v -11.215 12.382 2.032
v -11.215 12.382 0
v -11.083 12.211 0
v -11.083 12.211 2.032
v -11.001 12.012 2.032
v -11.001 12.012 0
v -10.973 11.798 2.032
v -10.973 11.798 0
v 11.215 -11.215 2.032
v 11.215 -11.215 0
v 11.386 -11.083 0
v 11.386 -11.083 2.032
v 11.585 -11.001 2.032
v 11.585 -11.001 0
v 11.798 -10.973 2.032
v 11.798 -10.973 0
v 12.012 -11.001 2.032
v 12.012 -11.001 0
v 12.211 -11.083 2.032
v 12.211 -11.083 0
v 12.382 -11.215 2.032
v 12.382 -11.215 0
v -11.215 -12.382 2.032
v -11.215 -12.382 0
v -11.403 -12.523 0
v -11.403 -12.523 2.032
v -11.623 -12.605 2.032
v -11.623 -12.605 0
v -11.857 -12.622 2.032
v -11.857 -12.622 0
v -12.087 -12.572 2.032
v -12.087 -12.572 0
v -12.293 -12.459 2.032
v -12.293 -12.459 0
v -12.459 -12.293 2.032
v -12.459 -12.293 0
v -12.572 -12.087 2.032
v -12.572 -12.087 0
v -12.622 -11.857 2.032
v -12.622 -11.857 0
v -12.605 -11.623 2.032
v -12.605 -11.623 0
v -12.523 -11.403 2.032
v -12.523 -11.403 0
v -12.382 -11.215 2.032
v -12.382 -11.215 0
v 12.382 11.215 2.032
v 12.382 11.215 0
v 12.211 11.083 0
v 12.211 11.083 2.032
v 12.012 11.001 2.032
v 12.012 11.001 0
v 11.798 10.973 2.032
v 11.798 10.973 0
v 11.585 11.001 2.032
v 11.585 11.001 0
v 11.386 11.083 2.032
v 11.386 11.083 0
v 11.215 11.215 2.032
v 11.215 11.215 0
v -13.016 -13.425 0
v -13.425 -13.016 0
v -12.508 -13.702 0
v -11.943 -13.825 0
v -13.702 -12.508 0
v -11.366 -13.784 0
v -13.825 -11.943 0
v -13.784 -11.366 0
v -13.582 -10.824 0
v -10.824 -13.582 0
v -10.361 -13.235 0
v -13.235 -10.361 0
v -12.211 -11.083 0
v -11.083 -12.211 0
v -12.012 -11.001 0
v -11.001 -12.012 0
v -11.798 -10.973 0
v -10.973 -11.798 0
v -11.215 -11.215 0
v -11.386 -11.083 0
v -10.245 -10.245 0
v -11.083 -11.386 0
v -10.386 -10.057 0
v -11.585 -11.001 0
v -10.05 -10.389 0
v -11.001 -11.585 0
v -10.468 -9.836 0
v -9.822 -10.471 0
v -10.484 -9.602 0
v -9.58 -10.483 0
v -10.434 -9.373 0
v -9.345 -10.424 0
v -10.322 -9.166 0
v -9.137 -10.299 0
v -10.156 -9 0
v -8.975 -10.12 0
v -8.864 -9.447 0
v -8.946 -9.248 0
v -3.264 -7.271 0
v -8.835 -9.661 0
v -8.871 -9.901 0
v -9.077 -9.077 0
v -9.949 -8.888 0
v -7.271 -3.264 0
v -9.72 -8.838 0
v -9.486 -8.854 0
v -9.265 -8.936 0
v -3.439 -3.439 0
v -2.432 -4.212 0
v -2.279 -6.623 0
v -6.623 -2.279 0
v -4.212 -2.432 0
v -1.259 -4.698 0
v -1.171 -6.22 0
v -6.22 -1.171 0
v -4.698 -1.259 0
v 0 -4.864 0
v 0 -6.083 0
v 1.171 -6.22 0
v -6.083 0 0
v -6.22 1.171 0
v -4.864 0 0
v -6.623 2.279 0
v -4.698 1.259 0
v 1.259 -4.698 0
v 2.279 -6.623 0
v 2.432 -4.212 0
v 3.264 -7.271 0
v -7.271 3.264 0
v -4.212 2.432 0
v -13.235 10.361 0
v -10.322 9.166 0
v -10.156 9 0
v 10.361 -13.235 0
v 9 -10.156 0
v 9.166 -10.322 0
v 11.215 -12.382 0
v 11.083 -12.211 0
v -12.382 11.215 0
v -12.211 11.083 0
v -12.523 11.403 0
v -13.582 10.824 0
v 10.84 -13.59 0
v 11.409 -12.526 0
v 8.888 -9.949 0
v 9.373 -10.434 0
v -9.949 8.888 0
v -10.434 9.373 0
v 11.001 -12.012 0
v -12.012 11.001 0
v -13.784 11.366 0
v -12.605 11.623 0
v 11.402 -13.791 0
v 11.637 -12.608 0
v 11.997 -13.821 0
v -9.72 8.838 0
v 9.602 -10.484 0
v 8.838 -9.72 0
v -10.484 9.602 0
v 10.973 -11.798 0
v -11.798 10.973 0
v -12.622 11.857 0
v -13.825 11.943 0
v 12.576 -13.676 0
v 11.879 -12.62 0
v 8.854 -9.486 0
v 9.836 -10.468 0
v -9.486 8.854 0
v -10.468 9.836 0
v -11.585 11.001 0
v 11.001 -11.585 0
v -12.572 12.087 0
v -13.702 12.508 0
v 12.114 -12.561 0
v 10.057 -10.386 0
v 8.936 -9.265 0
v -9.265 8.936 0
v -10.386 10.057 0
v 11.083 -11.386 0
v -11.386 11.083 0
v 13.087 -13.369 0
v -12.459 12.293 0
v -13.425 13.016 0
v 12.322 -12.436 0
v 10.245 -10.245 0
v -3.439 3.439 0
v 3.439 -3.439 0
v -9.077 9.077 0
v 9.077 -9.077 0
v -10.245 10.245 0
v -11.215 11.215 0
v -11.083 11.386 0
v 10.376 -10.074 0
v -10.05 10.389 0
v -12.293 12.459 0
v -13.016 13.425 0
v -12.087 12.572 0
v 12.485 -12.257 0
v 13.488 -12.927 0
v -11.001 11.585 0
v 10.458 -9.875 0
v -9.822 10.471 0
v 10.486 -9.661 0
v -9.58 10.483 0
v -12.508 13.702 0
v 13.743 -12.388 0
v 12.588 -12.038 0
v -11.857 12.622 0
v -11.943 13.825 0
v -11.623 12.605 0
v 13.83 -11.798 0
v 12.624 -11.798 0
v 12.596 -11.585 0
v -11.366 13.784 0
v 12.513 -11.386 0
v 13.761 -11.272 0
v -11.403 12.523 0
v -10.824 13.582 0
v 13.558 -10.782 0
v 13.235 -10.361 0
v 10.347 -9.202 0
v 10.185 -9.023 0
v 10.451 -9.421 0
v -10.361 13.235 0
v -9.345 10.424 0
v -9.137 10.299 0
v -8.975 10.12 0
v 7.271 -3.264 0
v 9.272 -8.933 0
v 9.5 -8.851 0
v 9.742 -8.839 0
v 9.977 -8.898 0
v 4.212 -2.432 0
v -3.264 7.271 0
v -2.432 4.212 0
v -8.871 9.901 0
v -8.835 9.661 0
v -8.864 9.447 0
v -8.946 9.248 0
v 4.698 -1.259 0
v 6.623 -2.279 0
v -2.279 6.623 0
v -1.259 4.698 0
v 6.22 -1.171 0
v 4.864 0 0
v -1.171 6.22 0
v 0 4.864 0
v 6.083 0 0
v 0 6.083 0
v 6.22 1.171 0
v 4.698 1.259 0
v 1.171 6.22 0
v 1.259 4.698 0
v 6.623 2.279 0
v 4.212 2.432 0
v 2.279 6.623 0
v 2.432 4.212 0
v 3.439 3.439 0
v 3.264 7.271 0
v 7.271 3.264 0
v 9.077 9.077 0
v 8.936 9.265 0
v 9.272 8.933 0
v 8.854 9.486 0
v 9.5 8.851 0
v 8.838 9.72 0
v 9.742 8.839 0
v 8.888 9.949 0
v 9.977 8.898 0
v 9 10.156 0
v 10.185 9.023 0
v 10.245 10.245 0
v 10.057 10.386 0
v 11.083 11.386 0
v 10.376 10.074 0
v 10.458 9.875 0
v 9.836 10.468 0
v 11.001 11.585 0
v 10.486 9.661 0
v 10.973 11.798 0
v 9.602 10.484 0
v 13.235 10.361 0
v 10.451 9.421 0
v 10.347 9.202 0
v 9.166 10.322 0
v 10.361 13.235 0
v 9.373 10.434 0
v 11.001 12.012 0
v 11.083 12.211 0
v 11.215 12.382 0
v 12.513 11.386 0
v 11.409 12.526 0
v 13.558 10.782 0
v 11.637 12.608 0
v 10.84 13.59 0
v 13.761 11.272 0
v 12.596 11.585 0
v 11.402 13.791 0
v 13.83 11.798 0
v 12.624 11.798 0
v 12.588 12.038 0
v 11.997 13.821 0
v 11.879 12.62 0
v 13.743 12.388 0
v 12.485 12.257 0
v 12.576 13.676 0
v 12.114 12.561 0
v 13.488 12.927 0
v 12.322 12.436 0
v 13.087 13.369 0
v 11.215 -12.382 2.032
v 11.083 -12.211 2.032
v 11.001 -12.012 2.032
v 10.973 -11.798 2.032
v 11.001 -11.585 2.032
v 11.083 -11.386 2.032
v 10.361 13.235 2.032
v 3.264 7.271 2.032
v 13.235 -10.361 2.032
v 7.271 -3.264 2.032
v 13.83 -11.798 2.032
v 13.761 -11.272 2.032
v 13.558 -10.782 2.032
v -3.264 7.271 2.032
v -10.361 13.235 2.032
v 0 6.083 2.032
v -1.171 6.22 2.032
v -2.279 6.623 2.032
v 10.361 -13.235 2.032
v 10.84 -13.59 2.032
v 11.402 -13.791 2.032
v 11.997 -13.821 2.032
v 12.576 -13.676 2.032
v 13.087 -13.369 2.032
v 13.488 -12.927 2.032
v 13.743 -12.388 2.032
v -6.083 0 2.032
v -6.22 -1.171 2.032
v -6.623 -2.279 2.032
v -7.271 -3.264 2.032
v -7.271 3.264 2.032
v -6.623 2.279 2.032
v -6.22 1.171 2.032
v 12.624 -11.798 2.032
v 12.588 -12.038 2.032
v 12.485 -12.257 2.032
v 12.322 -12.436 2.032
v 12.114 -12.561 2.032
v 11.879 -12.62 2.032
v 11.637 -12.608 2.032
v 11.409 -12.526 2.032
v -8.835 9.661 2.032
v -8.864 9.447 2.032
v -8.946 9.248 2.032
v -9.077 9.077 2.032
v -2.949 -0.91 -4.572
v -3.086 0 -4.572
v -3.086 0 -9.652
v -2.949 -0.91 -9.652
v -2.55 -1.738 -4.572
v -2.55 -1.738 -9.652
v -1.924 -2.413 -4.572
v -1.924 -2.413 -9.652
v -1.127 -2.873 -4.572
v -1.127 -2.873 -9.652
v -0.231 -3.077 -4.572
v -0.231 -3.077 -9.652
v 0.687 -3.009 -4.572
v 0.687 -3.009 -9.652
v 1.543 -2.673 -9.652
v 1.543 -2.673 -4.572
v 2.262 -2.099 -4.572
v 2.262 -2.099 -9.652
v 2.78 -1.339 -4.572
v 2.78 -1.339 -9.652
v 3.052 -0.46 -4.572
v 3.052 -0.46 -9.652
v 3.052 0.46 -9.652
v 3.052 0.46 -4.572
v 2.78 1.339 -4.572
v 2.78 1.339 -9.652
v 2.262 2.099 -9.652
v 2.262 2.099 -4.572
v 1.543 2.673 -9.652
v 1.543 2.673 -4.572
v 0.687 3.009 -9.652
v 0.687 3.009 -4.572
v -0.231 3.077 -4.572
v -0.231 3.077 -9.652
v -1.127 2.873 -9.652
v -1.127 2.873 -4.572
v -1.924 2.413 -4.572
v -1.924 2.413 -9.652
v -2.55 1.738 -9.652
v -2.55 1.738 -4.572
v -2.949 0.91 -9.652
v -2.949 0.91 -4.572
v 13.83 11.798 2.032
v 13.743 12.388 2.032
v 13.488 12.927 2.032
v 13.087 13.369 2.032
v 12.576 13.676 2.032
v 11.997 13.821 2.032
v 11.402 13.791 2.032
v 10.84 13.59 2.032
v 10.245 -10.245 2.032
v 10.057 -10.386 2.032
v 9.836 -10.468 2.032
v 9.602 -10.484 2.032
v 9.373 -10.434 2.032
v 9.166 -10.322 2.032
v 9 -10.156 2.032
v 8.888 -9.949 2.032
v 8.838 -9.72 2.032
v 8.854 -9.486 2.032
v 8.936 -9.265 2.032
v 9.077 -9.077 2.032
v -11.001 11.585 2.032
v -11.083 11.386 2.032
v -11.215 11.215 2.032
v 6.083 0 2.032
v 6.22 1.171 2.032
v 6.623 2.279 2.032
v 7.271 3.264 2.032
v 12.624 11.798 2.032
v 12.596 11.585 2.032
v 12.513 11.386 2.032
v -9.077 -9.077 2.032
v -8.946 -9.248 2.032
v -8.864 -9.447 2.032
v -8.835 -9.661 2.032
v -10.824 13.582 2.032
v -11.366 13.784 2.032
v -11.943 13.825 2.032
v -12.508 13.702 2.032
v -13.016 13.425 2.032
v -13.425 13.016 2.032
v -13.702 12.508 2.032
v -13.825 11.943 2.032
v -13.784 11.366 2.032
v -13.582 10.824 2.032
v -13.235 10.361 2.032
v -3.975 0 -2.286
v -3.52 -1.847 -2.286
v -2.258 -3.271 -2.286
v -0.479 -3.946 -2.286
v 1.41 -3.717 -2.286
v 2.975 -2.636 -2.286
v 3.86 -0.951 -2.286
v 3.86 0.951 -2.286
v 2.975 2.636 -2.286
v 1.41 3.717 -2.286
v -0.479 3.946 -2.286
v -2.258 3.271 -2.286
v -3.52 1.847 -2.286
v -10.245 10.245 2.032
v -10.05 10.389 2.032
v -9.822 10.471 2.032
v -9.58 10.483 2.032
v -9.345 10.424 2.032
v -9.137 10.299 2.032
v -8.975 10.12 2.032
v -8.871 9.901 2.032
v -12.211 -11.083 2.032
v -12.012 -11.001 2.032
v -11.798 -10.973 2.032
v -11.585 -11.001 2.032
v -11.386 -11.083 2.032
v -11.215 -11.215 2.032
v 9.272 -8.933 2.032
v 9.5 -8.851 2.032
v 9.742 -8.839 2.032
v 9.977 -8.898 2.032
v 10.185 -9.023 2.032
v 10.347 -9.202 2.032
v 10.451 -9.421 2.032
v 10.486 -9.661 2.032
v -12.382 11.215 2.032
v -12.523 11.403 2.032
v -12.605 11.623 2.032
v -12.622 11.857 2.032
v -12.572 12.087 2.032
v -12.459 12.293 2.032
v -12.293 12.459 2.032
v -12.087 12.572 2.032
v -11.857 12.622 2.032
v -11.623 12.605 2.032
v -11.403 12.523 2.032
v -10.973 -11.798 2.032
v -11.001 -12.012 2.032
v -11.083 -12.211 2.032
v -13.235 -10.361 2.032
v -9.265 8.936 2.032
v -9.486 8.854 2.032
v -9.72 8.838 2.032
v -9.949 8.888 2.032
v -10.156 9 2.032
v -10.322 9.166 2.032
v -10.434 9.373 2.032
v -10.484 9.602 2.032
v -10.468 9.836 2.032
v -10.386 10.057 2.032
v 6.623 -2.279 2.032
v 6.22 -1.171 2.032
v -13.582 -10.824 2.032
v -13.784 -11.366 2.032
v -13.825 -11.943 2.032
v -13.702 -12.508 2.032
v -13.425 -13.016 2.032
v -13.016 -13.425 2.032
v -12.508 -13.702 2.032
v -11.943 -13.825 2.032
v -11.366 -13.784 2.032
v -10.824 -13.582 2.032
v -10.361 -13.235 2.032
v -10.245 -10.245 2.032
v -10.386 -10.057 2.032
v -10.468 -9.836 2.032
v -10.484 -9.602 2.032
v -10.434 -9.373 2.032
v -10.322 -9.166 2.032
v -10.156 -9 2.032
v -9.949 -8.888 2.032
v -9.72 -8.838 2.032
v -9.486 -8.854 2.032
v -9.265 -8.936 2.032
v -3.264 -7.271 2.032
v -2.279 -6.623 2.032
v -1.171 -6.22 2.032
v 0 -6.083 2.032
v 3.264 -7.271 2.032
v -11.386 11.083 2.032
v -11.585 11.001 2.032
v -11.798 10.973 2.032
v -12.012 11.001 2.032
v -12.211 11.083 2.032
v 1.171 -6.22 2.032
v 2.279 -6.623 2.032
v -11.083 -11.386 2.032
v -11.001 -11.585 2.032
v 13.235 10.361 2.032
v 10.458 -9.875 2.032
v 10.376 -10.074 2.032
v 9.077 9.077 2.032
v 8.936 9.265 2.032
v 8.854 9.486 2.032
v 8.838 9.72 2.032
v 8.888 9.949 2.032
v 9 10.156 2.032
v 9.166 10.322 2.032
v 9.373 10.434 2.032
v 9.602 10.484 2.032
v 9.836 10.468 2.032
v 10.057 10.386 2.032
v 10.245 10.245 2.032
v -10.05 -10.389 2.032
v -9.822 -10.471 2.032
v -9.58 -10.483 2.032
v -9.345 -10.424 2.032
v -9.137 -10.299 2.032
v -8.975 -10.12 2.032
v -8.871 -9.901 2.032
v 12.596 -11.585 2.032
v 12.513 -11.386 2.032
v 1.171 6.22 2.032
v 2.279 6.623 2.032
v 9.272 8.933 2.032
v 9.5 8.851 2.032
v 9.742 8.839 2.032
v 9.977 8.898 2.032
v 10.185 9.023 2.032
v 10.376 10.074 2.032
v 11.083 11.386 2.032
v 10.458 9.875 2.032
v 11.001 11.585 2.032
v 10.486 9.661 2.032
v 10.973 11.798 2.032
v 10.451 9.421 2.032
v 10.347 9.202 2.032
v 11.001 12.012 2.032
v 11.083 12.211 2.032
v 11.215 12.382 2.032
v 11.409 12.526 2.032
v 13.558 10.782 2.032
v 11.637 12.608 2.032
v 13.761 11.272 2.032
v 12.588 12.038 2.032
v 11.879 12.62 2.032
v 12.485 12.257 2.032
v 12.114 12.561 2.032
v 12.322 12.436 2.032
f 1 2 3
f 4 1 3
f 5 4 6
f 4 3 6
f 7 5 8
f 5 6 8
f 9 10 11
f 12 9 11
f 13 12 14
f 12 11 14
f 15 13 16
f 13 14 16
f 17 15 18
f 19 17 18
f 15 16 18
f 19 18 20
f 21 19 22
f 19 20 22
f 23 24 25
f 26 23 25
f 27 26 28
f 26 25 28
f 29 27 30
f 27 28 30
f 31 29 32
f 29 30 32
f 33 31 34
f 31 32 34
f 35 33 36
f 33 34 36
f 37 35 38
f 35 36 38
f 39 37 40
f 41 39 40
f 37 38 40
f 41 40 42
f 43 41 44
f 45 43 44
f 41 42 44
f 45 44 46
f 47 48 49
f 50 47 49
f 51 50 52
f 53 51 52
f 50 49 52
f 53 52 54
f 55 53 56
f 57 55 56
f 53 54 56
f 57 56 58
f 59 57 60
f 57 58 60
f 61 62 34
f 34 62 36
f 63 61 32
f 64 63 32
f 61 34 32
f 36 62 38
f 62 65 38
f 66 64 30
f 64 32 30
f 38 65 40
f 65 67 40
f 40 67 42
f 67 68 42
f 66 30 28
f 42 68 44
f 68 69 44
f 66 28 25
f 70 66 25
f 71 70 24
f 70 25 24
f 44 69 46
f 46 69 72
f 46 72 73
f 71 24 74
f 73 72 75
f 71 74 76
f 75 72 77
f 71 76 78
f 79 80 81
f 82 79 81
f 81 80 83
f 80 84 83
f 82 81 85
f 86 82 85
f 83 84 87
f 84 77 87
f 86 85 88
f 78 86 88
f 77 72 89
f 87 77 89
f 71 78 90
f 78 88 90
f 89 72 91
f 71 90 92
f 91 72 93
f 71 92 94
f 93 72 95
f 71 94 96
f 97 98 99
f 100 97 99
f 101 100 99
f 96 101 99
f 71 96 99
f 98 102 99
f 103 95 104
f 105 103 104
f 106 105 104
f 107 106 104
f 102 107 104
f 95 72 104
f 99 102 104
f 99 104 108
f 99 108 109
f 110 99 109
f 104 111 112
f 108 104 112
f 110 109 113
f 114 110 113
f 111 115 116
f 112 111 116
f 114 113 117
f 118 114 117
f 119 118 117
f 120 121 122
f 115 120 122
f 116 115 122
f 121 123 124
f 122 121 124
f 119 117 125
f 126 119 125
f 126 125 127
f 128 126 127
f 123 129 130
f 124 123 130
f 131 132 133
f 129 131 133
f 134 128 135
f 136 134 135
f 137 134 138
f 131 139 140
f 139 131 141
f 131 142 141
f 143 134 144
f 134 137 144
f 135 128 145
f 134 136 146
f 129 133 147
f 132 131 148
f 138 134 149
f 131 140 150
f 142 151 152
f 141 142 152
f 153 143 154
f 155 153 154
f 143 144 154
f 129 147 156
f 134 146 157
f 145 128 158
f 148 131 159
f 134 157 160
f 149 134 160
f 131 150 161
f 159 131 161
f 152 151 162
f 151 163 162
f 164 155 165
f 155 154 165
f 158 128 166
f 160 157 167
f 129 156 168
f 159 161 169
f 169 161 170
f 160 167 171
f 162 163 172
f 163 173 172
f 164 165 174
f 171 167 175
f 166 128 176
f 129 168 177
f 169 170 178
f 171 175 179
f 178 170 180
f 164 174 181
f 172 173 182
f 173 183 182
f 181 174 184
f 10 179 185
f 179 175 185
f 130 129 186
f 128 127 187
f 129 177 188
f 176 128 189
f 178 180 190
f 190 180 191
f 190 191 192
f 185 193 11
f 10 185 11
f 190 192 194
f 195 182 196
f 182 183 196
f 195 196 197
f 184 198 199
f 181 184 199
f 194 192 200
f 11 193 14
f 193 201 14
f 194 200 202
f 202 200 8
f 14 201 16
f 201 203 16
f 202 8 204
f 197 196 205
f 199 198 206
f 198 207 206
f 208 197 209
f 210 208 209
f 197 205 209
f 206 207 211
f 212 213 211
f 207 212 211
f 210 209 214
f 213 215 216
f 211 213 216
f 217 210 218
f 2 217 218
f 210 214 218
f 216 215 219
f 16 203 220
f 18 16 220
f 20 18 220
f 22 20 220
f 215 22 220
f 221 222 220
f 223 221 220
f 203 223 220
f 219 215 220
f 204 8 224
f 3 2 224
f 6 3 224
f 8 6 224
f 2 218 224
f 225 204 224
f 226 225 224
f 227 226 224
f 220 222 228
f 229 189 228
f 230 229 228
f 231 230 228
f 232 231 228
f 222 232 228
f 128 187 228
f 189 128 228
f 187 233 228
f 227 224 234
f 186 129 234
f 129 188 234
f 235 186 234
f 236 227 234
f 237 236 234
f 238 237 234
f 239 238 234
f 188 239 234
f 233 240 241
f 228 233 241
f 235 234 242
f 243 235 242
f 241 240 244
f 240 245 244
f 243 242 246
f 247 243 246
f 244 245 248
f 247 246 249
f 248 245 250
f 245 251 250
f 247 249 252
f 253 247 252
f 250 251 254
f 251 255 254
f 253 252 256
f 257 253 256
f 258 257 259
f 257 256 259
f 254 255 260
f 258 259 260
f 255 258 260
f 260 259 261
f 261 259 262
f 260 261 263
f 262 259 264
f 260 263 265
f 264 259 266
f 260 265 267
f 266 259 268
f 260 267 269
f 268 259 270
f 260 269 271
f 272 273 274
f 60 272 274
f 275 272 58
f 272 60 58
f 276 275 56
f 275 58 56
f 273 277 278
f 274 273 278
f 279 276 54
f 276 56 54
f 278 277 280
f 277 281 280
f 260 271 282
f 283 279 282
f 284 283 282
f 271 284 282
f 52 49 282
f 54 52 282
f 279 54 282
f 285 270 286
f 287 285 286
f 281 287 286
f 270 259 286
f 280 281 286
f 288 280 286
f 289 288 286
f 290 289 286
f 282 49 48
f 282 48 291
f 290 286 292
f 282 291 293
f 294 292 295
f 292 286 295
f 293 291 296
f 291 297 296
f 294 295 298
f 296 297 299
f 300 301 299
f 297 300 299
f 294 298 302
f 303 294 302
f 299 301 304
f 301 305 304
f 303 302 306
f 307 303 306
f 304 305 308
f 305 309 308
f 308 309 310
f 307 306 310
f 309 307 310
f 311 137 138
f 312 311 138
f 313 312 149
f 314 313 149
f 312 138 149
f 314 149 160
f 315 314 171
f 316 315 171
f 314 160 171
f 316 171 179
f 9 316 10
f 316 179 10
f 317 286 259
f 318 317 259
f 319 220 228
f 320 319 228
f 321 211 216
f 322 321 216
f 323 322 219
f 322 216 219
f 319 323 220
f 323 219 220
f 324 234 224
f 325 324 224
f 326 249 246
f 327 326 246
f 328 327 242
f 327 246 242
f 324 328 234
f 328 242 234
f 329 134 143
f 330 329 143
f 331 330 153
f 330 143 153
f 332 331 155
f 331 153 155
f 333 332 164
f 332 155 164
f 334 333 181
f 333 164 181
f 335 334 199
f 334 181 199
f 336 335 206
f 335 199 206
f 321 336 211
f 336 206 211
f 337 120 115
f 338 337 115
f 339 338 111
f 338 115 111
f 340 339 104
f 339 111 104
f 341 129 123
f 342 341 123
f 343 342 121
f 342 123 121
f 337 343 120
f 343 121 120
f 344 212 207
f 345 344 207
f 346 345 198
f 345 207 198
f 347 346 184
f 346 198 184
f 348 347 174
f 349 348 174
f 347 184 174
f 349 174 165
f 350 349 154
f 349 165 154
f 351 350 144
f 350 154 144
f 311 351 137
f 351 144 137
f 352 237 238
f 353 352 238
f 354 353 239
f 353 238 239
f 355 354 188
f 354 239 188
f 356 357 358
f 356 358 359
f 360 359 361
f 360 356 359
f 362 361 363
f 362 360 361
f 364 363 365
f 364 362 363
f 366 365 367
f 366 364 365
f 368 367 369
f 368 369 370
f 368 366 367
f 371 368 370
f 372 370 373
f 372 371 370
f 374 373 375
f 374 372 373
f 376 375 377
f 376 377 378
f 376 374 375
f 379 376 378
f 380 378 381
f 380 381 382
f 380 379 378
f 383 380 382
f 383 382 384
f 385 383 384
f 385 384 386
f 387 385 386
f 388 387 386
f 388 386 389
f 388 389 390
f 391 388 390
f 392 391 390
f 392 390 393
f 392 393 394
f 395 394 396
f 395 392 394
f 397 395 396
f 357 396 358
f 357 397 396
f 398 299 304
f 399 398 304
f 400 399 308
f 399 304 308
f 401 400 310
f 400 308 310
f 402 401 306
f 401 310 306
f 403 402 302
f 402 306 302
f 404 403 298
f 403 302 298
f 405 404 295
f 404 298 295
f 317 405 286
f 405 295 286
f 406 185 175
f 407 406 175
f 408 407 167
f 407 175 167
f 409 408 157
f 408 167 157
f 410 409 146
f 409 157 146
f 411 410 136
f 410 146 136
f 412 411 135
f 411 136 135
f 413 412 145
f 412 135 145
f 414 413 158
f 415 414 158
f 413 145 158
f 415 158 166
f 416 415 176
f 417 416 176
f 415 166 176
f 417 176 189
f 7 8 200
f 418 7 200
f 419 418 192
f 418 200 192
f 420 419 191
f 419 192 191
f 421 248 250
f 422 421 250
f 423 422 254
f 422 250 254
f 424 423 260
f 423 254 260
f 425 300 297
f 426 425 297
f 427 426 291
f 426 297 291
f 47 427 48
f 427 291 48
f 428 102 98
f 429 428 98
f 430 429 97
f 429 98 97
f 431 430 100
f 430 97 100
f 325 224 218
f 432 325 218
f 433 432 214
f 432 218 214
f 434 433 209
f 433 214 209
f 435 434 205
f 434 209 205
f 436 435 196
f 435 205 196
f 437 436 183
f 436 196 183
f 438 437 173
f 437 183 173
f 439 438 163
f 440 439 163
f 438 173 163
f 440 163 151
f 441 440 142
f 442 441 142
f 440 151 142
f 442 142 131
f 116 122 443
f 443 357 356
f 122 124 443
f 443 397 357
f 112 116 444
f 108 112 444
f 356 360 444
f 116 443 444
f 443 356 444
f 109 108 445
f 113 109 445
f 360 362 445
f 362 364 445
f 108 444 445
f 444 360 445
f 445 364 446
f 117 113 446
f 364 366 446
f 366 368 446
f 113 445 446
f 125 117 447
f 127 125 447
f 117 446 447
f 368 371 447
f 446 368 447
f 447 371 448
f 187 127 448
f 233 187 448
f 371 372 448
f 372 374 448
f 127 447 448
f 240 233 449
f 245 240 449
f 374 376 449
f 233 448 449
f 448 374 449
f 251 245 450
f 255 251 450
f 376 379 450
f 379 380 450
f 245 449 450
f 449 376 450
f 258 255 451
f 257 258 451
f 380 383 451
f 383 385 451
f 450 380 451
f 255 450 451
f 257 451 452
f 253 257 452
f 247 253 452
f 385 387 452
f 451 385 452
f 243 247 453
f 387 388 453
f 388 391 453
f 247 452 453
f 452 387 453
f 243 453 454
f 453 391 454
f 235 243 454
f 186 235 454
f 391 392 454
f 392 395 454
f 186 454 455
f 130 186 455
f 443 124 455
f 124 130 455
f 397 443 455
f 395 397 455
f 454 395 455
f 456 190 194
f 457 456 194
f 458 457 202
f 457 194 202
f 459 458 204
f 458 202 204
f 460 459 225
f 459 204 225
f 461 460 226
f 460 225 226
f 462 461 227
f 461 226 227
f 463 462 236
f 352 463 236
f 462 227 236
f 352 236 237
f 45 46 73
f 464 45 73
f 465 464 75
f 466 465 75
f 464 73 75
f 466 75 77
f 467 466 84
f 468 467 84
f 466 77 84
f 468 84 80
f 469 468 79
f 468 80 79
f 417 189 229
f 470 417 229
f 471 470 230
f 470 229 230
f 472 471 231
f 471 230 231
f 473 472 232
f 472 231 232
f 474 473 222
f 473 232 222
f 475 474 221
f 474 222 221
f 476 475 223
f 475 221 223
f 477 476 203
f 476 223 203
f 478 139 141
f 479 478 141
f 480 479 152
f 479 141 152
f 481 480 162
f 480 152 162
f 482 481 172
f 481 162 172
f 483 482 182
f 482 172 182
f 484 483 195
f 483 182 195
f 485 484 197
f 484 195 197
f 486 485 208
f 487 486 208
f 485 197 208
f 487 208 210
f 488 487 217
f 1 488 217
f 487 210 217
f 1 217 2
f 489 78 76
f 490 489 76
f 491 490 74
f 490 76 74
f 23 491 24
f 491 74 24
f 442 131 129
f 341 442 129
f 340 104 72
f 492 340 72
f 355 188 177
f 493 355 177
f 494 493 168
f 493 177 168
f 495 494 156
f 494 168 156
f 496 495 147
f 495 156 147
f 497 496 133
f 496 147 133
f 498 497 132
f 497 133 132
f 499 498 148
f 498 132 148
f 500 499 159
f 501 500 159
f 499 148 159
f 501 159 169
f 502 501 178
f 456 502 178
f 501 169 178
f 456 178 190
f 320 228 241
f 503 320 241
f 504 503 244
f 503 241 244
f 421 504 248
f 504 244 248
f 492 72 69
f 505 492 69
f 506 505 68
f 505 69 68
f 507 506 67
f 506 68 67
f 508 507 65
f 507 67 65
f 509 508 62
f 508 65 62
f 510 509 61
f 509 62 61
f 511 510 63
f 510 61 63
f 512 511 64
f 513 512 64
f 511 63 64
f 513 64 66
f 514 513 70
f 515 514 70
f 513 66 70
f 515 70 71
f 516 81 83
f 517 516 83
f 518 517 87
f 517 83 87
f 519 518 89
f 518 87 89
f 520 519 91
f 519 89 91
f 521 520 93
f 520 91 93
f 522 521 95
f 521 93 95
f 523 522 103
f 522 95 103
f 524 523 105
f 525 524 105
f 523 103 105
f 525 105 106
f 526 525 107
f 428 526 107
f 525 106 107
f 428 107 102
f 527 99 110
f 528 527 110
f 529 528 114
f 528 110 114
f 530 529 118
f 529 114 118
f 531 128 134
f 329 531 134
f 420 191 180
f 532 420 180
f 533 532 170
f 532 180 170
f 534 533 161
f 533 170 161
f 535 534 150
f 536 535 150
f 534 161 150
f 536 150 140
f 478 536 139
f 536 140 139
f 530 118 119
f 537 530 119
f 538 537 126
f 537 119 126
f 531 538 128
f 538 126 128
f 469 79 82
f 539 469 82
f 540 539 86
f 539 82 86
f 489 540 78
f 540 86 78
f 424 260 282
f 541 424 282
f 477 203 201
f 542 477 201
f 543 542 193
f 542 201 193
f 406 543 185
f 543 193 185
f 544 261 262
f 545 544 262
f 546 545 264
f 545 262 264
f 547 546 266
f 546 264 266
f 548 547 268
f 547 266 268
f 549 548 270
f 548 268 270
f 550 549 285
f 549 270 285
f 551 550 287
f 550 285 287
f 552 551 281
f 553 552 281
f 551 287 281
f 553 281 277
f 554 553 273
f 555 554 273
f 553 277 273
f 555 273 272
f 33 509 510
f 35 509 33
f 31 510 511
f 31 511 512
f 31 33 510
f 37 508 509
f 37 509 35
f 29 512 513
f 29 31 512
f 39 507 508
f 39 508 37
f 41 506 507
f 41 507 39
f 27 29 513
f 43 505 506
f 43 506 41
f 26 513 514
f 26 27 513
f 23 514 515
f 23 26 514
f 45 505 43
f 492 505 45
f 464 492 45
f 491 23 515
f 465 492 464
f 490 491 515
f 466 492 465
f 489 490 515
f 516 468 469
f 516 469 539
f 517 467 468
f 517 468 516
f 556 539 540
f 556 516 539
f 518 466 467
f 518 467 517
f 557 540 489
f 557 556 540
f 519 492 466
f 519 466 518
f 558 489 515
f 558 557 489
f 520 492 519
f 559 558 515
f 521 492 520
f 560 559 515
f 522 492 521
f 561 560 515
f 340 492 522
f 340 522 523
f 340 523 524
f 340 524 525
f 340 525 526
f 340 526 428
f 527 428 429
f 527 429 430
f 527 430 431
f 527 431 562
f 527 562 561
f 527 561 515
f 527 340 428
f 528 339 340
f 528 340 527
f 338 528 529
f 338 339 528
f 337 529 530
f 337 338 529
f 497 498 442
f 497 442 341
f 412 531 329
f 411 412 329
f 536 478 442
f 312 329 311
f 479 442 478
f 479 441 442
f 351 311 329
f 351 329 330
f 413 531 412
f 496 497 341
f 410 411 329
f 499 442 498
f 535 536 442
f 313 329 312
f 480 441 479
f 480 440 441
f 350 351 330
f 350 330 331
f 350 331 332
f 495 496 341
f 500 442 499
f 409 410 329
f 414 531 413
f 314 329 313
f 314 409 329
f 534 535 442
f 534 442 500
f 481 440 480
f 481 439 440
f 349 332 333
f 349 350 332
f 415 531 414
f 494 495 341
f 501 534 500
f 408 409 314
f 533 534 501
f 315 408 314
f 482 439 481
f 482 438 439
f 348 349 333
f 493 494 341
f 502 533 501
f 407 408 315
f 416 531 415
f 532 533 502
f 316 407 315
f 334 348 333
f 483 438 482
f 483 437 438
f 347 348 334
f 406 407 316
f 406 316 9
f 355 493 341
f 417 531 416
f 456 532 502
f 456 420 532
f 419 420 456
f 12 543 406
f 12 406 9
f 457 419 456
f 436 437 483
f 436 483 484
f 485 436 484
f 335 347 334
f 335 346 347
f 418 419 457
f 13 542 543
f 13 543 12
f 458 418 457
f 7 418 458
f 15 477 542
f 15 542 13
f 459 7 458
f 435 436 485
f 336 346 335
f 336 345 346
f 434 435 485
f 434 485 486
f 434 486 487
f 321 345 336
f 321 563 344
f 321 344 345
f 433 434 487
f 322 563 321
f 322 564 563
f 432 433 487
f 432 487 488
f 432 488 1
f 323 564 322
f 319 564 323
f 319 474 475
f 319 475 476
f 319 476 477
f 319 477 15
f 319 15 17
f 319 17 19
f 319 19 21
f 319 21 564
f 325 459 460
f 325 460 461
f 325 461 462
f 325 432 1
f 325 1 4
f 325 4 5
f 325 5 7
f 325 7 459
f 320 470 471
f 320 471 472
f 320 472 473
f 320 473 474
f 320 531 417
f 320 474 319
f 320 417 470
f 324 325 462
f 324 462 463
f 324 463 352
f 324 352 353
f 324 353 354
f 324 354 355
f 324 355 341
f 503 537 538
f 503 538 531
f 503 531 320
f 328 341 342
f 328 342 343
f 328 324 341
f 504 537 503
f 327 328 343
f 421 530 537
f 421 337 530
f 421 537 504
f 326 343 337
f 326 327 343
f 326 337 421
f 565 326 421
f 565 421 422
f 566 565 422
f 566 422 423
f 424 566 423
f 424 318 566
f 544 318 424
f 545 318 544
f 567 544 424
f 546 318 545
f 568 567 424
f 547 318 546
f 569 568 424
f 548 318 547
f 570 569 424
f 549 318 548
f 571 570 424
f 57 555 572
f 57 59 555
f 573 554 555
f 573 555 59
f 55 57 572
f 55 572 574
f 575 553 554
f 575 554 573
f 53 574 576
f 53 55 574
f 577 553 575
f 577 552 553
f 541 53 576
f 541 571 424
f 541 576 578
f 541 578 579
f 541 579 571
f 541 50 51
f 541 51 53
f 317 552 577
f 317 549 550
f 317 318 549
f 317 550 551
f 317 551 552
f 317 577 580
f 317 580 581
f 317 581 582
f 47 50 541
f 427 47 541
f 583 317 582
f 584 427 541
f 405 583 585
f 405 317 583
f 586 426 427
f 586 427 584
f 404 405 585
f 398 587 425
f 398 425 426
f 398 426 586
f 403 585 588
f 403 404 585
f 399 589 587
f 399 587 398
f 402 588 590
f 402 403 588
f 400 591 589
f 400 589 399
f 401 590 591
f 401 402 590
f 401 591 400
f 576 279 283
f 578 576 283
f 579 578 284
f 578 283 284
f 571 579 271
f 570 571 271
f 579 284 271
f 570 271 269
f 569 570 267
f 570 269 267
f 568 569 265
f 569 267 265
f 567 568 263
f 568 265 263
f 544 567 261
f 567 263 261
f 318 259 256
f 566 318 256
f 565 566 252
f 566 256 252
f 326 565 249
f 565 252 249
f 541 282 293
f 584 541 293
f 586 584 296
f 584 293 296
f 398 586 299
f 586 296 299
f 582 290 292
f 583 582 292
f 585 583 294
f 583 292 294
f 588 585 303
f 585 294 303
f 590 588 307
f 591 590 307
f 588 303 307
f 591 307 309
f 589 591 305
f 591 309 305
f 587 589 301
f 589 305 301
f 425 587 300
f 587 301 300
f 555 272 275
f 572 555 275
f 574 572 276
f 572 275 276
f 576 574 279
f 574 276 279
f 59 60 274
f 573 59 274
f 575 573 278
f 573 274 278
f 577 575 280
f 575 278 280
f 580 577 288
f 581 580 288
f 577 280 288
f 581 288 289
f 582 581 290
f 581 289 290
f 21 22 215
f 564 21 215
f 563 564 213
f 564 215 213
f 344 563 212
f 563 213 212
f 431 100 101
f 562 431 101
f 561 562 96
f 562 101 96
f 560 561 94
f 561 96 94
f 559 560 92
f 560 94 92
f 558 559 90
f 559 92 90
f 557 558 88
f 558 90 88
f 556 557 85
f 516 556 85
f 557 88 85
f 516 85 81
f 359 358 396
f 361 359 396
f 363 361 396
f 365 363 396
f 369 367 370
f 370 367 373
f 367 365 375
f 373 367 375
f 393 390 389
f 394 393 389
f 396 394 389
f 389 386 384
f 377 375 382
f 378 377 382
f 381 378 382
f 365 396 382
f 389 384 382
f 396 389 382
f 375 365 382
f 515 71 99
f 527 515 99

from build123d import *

# Parameters (mm, degrees)
F1_DEPTH = 2.032
F2_DEPTH = 4.572
F4_DEPTH = 5.08


# Not quite as in the source:
# - a fillet or chamfer that OpenCascade refuses, or shapes differently, is made with other operations: its cross-section is extruded or revolved along the edge and cut away or added


with BuildPart() as f1:
    # F0 (on Top) → F1 (new body)
    with BuildSketch(Plane.XY):
        with BuildLine():
            Line((-11.2145823858, 12.3820156815), (-10.3614580543, 13.235140013))
            ThreePointArc((-10.3614580543, 13.235140013), (-13.235140013, 13.235140013), (-13.235140013, 10.3614580543))
            Line((-13.235140013, 10.3614580543), (-12.3820156815, 11.2145823858))
            ThreePointArc((-12.3820156815, 11.2145823858), (-12.3820156815, 12.3820156815), (-11.2145823858, 12.3820156815))
        make_face()
        with BuildLine():
            ThreePointArc((13.8302990336, 11.7982990336), (12.5759117682, 13.6756222437), (10.3614580543, 13.235140013))
            Line((10.3614580543, 13.235140013), (11.2145823858, 12.3820156815))
            ThreePointArc((11.2145823858, 12.3820156815), (12.1142042071, 12.5609615877), (12.6237990336, 11.7982990336))
            ThreePointArc((12.6237990336, 11.7982990336), (12.5609615877, 11.4823938602), (12.3820156815, 11.2145823858))
            Line((12.3820156815, 11.2145823858), (13.235140013, 10.3614580543))
            ThreePointArc((13.235140013, 10.3614580543), (13.6756222437, 11.0206862991), (13.8302990336, 11.7982990336))
        make_face()
        with BuildLine():
            ThreePointArc((13.8302990336, -11.7982990336), (13.6756222437, -11.0206862991), (13.235140013, -10.3614580543))
            Line((13.235140013, -10.3614580543), (12.3820156815, -11.2145823858))
            ThreePointArc((12.3820156815, -11.2145823858), (12.5609615877, -11.4823938602), (12.6237990336, -11.7982990336))
            ThreePointArc((12.6237990336, -11.7982990336), (12.1142042071, -12.5609615877), (11.2145823858, -12.3820156815))
            Line((11.2145823858, -12.3820156815), (10.3614580543, -13.235140013))
            ThreePointArc((10.3614580543, -13.235140013), (12.5759117682, -13.6756222437), (13.8302990336, -11.7982990336))
        make_face()
        with BuildLine():
            Line((-12.3820156815, -11.2145823858), (-13.235140013, -10.3614580543))
            ThreePointArc((-13.235140013, -10.3614580543), (-13.235140013, -13.235140013), (-10.3614580543, -13.235140013))
            Line((-10.3614580543, -13.235140013), (-11.2145823858, -12.3820156815))
            ThreePointArc((-11.2145823858, -12.3820156815), (-12.3820156815, -12.3820156815), (-12.3820156815, -11.2145823858))
        make_face()
        with BuildLine():
            Line((-12.3820156815, 11.2145823858), (-13.235140013, 10.3614580543))
            ThreePointArc((-13.235140013, 10.3614580543), (-11.7982990336, 9.7662990336), (-10.3614580543, 10.3614580543))
            Line((-10.3614580543, 10.3614580543), (-11.2145823858, 11.2145823858))
            ThreePointArc((-11.2145823858, 11.2145823858), (-11.7982990336, 10.9727990336), (-12.3820156815, 11.2145823858))
        make_face()
        with BuildLine():
            ThreePointArc((-9.7662990336, 11.7982990336), (-9.9209758236, 12.5759117682), (-10.3614580543, 13.235140013))
            Line((-10.3614580543, 13.235140013), (-11.2145823858, 12.3820156815))
            ThreePointArc((-11.2145823858, 12.3820156815), (-11.0356364796, 12.1142042071), (-10.9727990336, 11.7982990336))
            ThreePointArc((-10.9727990336, 11.7982990336), (-11.0356364796, 11.4823938602), (-11.2145823858, 11.2145823858))
            Line((-11.2145823858, 11.2145823858), (-10.3614580543, 10.3614580543))
            ThreePointArc((-10.3614580543, 10.3614580543), (-9.9209758236, 11.0206862991), (-9.7662990336, 11.7982990336))
        make_face()
        with BuildLine():
            Line((11.2145823858, 12.3820156815), (10.3614580543, 13.235140013))
            ThreePointArc((10.3614580543, 13.235140013), (9.7662990336, 11.7982990336), (10.3614580543, 10.3614580543))
            Line((10.3614580543, 10.3614580543), (11.2145823858, 11.2145823858))
            ThreePointArc((11.2145823858, 11.2145823858), (10.9727990336, 11.7982990336), (11.2145823858, 12.3820156815))
        make_face()
        with BuildLine():
            Line((11.2145823858, 11.2145823858), (10.3614580543, 10.3614580543))
            ThreePointArc((10.3614580543, 10.3614580543), (11.7982990336, 9.7662990336), (13.235140013, 10.3614580543))
            Line((13.235140013, 10.3614580543), (12.3820156815, 11.2145823858))
            ThreePointArc((12.3820156815, 11.2145823858), (11.7982990336, 10.9727990336), (11.2145823858, 11.2145823858))
        make_face()
        with BuildLine():
            Line((12.3820156815, -11.2145823858), (13.235140013, -10.3614580543))
            ThreePointArc((13.235140013, -10.3614580543), (11.7982990336, -9.7662990336), (10.3614580543, -10.3614580543))
            Line((10.3614580543, -10.3614580543), (11.2145823858, -11.2145823858))
            ThreePointArc((11.2145823858, -11.2145823858), (11.7982990336, -10.9727990336), (12.3820156815, -11.2145823858))
        make_face()
        with BuildLine():
            ThreePointArc((10.3614580543, -10.3614580543), (9.7662990336, -11.7982990336), (10.3614580543, -13.235140013))
            Line((10.3614580543, -13.235140013), (11.2145823858, -12.3820156815))
            ThreePointArc((11.2145823858, -12.3820156815), (10.9727990336, -11.7982990336), (11.2145823858, -11.2145823858))
            Line((11.2145823858, -11.2145823858), (10.3614580543, -10.3614580543))
        make_face()
        with BuildLine():
            Line((-11.2145823858, -12.3820156815), (-10.3614580543, -13.235140013))
            ThreePointArc((-10.3614580543, -13.235140013), (-9.9209758236, -12.5759117682), (-9.7662990336, -11.7982990336))
            ThreePointArc((-9.7662990336, -11.7982990336), (-9.9209758236, -11.0206862991), (-10.3614580543, -10.3614580543))
            Line((-10.3614580543, -10.3614580543), (-11.2145823858, -11.2145823858))
            ThreePointArc((-11.2145823858, -11.2145823858), (-11.0356364796, -11.4823938602), (-10.9727990336, -11.7982990336))
            ThreePointArc((-10.9727990336, -11.7982990336), (-11.0356364796, -12.1142042071), (-11.2145823858, -12.3820156815))
        make_face()
        with BuildLine():
            ThreePointArc((-10.3614580543, -10.3614580543), (-11.7982990336, -9.7662990336), (-13.235140013, -10.3614580543))
            Line((-13.235140013, -10.3614580543), (-12.3820156815, -11.2145823858))
            ThreePointArc((-12.3820156815, -11.2145823858), (-11.7982990336, -10.9727990336), (-11.2145823858, -11.2145823858))
            Line((-11.2145823858, -11.2145823858), (-10.3614580543, -10.3614580543))
        make_face()
        with BuildLine():
            Line((-5.2672343618, 5.2672343618), (-3.2639, 7.2705687236))
            Line((-3.2639, 7.2705687236), (-10.3614580543, 13.235140013))
            ThreePointArc((-10.3614580543, 13.235140013), (-9.9209758236, 12.5759117682), (-9.7662990336, 11.7982990336))
            ThreePointArc((-9.7662990336, 11.7982990336), (-9.9209758236, 11.0206862991), (-10.3614580543, 10.3614580543))
            Line((-10.3614580543, 10.3614580543), (-10.2447147247, 10.2447147247))
            ThreePointArc((-10.2447147247, 10.2447147247), (-9.3450929034, 10.4236606309), (-8.8354980768, 9.6609980768))
            ThreePointArc((-8.8354980768, 9.6609980768), (-8.8983355227, 9.3450929034), (-9.077281429, 9.077281429))
            Line((-9.077281429, 9.077281429), (-5.2672343618, 5.2672343618))
        make_face()
        with BuildLine():
            Line((10.3614580543, 13.235140013), (3.2639, 7.2705687236))
            Line((3.2639, 7.2705687236), (5.2672343618, 5.2672343618))
            Line((5.2672343618, 5.2672343618), (9.077281429, 9.077281429))
            ThreePointArc((9.077281429, 9.077281429), (9.077281429, 10.2447147247), (10.2447147247, 10.2447147247))
            Line((10.2447147247, 10.2447147247), (10.3614580543, 10.3614580543))
            ThreePointArc((10.3614580543, 10.3614580543), (9.7662990336, 11.7982990336), (10.3614580543, 13.235140013))
        make_face()
        with BuildLine():
            Line((9.077281429, 9.077281429), (5.2672343618, 5.2672343618))
            Line((5.2672343618, 5.2672343618), (7.2705687236, 3.2639))
            Line((7.2705687236, 3.2639), (13.235140013, 10.3614580543))
            ThreePointArc((13.235140013, 10.3614580543), (11.7982990336, 9.7662990336), (10.3614580543, 10.3614580543))
            Line((10.3614580543, 10.3614580543), (10.2447147247, 10.2447147247))
            ThreePointArc((10.2447147247, 10.2447147247), (10.4236606309, 9.9769032503), (10.4864980768, 9.6609980768))
            ThreePointArc((10.4864980768, 9.6609980768), (9.9769032503, 8.8983355227), (9.077281429, 9.077281429))
        make_face()
        with BuildLine():
            Line((13.235140013, -10.3614580543), (7.2705687236, -3.2639))
            Line((7.2705687236, -3.2639), (5.2672343618, -5.2672343618))
            Line((5.2672343618, -5.2672343618), (9.077281429, -9.077281429))
            ThreePointArc((9.077281429, -9.077281429), (9.9769032503, -8.8983355227), (10.4864980768, -9.6609980768))
            ThreePointArc((10.4864980768, -9.6609980768), (10.4236606309, -9.9769032503), (10.2447147247, -10.2447147247))
            Line((10.2447147247, -10.2447147247), (10.3614580543, -10.3614580543))
            ThreePointArc((10.3614580543, -10.3614580543), (11.7982990336, -9.7662990336), (13.235140013, -10.3614580543))
        make_face()
        with BuildLine():
            Line((5.2672343618, -5.2672343618), (3.2639, -7.2705687236))
            Line((3.2639, -7.2705687236), (10.3614580543, -13.235140013))
            ThreePointArc((10.3614580543, -13.235140013), (9.7662990336, -11.7982990336), (10.3614580543, -10.3614580543))
            Line((10.3614580543, -10.3614580543), (10.2447147247, -10.2447147247))
            ThreePointArc((10.2447147247, -10.2447147247), (9.077281429, -10.2447147247), (9.077281429, -9.077281429))
            Line((9.077281429, -9.077281429), (5.2672343618, -5.2672343618))
        make_face()
        with BuildLine():
            Line((-3.2639, -7.2705687236), (-5.2672343618, -5.2672343618))
            Line((-5.2672343618, -5.2672343618), (-9.077281429, -9.077281429))
            ThreePointArc((-9.077281429, -9.077281429), (-8.8983355227, -9.3450929034), (-8.8354980768, -9.6609980768))
            ThreePointArc((-8.8354980768, -9.6609980768), (-9.3450929034, -10.4236606309), (-10.2447147247, -10.2447147247))
            Line((-10.2447147247, -10.2447147247), (-10.3614580543, -10.3614580543))
            ThreePointArc((-10.3614580543, -10.3614580543), (-9.9209758236, -11.0206862991), (-9.7662990336, -11.7982990336))
            ThreePointArc((-9.7662990336, -11.7982990336), (-9.9209758236, -12.5759117682), (-10.3614580543, -13.235140013))
            Line((-10.3614580543, -13.235140013), (-3.2639, -7.2705687236))
        make_face()
        with BuildLine():
            Line((-7.2705687236, 3.2639), (-5.2672343618, 5.2672343618))
            Line((-5.2672343618, 5.2672343618), (-9.077281429, 9.077281429))
            ThreePointArc((-9.077281429, 9.077281429), (-10.2447147247, 9.077281429), (-10.2447147247, 10.2447147247))
            Line((-10.2447147247, 10.2447147247), (-10.3614580543, 10.3614580543))
            ThreePointArc((-10.3614580543, 10.3614580543), (-11.7982990336, 9.7662990336), (-13.235140013, 10.3614580543))
            Line((-13.235140013, 10.3614580543), (-7.2705687236, 3.2639))
        make_face()
        with BuildLine():
            Line((-5.2672343618, -5.2672343618), (-7.2705687236, -3.2639))
            Line((-7.2705687236, -3.2639), (-13.235140013, -10.3614580543))
            ThreePointArc((-13.235140013, -10.3614580543), (-11.7982990336, -9.7662990336), (-10.3614580543, -10.3614580543))
            Line((-10.3614580543, -10.3614580543), (-10.2447147247, -10.2447147247))
            ThreePointArc((-10.2447147247, -10.2447147247), (-10.2447147247, -9.077281429), (-9.077281429, -9.077281429))
            Line((-9.077281429, -9.077281429), (-5.2672343618, -5.2672343618))
        make_face()
        with BuildLine():
            ThreePointArc((3.2639, 7.2705687236), (1.7365663126, 6.3893354587), (0, 6.0833))
            Line((0, 6.0833), (0, 4.8641))
            ThreePointArc((0, 4.8641), (3.4394380944, 3.4394380944), (4.8641, 0))
            Line((4.8641, 0), (6.0833, 0))
            ThreePointArc((6.0833, 0), (6.3893354587, 1.7365663126), (7.2705687236, 3.2639))
            Line((7.2705687236, 3.2639), (5.2672343618, 5.2672343618))
            Line((5.2672343618, 5.2672343618), (3.2639, 7.2705687236))
        make_face()
        with BuildLine():
            Line((0, 4.8641), (0, 6.0833))
            ThreePointArc((0, 6.0833), (-1.7365663126, 6.3893354587), (-3.2639, 7.2705687236))
            Line((-3.2639, 7.2705687236), (-5.2672343618, 5.2672343618))
            Line((-5.2672343618, 5.2672343618), (-7.2705687236, 3.2639))
            ThreePointArc((-7.2705687236, 3.2639), (-6.3893354587, 1.7365663126), (-6.0833, 0))
            Line((-6.0833, 0), (-4.8641, 0))
            ThreePointArc((-4.8641, 0), (-3.4394380944, 3.4394380944), (0, 4.8641))
        make_face()
        with BuildLine():
            Line((0, -4.8641), (0, 0))
            Line((0, 0), (-4.8641, 0))
            ThreePointArc((-4.8641, 0), (-3.4394380944, -3.4394380944), (0, -4.8641))
        make_face()
        with BuildLine():
            Line((4.8641, 0), (0, 0))
            Line((0, 0), (0, -4.8641))
            ThreePointArc((0, -4.8641), (3.4394380944, -3.4394380944), (4.8641, 0))
        make_face()
        with BuildLine():
            Line((5.2672343618, -5.2672343618), (7.2705687236, -3.2639))
            ThreePointArc((7.2705687236, -3.2639), (6.3893354587, -1.7365663126), (6.0833, 0))
            Line((6.0833, 0), (4.8641, 0))
            ThreePointArc((4.8641, 0), (3.4394380944, -3.4394380944), (0, -4.8641))
            Line((0, -4.8641), (0, -6.0833))
            ThreePointArc((0, -6.0833), (1.7365663126, -6.3893354587), (3.2639, -7.2705687236))
            Line((3.2639, -7.2705687236), (5.2672343618, -5.2672343618))
        make_face()
        with BuildLine():
            ThreePointArc((-6.0833, 0), (-6.3893354587, -1.7365663126), (-7.2705687236, -3.2639))
            Line((-7.2705687236, -3.2639), (-5.2672343618, -5.2672343618))
            Line((-5.2672343618, -5.2672343618), (-3.2639, -7.2705687236))
            ThreePointArc((-3.2639, -7.2705687236), (-1.7365663126, -6.3893354587), (0, -6.0833))
            Line((0, -6.0833), (0, -4.8641))
            ThreePointArc((0, -4.8641), (-3.4394380944, -3.4394380944), (-4.8641, 0))
            Line((-4.8641, 0), (-6.0833, 0))
        make_face()
        with BuildLine():
            Line((0, 0), (0, 4.8641))
            ThreePointArc((0, 4.8641), (-3.4394380944, 3.4394380944), (-4.8641, 0))
            Line((-4.8641, 0), (0, 0))
        make_face()
        with BuildLine():
            ThreePointArc((4.8641, 0), (3.4394380944, 3.4394380944), (0, 4.8641))
            Line((0, 4.8641), (0, 0))
            Line((0, 0), (4.8641, 0))
        make_face()
    extrude(amount=F1_DEPTH)

    # F0 (on Top) → F2 (join)
    with BuildSketch(Plane.XY):
        with BuildLine():
            Line((0, 0), (0, 4.8641))
            ThreePointArc((0, 4.8641), (-3.4394380944, 3.4394380944), (-4.8641, 0))
            Line((-4.8641, 0), (0, 0))
        make_face()
        with BuildLine():
            Line((4.8641, 0), (0, 0))
            Line((0, 0), (0, -4.8641))
            ThreePointArc((0, -4.8641), (3.4394380944, -3.4394380944), (4.8641, 0))
        make_face()
        with BuildLine():
            ThreePointArc((4.8641, 0), (3.4394380944, 3.4394380944), (0, 4.8641))
            Line((0, 4.8641), (0, 0))
            Line((0, 0), (4.8641, 0))
        make_face()
        with BuildLine():
            Line((0, -4.8641), (0, 0))
            Line((0, 0), (-4.8641, 0))
            ThreePointArc((-4.8641, 0), (-3.4394380944, -3.4394380944), (0, -4.8641))
        make_face()
    extrude(amount=-F2_DEPTH)

    # F3: chamfer of 4.572 x 1.778 on 1 edges, made by hand


with BuildPart() as f3_tool2:
    # F3_s3 → F3_t4 (revolve)
    with BuildSketch(Plane.XZ):
        Polygon((-4.8641, 0), (-3.0861, -4.572), (-4.8641, -4.572), align=None)
    revolve(axis=Axis((0, 0, -4.572), (0, 0, 1)))

    split(bisect_by=Plane.XY, keep=Keep.BOTTOM)


with BuildPart() as f1_1:
    add(f1.part)

    # F3_t1: cut F3_tool2
    add(f3_tool2.part, mode=Mode.SUBTRACT)

    # F4 (add): a face of the model
    f4_faces = [f1_1.faces().sort_by_distance(p)[0] for p in [
        (0, 0, -4.572),
    ]]
    extrude(f4_faces, amount=F4_DEPTH)


solid = f1_1.part
